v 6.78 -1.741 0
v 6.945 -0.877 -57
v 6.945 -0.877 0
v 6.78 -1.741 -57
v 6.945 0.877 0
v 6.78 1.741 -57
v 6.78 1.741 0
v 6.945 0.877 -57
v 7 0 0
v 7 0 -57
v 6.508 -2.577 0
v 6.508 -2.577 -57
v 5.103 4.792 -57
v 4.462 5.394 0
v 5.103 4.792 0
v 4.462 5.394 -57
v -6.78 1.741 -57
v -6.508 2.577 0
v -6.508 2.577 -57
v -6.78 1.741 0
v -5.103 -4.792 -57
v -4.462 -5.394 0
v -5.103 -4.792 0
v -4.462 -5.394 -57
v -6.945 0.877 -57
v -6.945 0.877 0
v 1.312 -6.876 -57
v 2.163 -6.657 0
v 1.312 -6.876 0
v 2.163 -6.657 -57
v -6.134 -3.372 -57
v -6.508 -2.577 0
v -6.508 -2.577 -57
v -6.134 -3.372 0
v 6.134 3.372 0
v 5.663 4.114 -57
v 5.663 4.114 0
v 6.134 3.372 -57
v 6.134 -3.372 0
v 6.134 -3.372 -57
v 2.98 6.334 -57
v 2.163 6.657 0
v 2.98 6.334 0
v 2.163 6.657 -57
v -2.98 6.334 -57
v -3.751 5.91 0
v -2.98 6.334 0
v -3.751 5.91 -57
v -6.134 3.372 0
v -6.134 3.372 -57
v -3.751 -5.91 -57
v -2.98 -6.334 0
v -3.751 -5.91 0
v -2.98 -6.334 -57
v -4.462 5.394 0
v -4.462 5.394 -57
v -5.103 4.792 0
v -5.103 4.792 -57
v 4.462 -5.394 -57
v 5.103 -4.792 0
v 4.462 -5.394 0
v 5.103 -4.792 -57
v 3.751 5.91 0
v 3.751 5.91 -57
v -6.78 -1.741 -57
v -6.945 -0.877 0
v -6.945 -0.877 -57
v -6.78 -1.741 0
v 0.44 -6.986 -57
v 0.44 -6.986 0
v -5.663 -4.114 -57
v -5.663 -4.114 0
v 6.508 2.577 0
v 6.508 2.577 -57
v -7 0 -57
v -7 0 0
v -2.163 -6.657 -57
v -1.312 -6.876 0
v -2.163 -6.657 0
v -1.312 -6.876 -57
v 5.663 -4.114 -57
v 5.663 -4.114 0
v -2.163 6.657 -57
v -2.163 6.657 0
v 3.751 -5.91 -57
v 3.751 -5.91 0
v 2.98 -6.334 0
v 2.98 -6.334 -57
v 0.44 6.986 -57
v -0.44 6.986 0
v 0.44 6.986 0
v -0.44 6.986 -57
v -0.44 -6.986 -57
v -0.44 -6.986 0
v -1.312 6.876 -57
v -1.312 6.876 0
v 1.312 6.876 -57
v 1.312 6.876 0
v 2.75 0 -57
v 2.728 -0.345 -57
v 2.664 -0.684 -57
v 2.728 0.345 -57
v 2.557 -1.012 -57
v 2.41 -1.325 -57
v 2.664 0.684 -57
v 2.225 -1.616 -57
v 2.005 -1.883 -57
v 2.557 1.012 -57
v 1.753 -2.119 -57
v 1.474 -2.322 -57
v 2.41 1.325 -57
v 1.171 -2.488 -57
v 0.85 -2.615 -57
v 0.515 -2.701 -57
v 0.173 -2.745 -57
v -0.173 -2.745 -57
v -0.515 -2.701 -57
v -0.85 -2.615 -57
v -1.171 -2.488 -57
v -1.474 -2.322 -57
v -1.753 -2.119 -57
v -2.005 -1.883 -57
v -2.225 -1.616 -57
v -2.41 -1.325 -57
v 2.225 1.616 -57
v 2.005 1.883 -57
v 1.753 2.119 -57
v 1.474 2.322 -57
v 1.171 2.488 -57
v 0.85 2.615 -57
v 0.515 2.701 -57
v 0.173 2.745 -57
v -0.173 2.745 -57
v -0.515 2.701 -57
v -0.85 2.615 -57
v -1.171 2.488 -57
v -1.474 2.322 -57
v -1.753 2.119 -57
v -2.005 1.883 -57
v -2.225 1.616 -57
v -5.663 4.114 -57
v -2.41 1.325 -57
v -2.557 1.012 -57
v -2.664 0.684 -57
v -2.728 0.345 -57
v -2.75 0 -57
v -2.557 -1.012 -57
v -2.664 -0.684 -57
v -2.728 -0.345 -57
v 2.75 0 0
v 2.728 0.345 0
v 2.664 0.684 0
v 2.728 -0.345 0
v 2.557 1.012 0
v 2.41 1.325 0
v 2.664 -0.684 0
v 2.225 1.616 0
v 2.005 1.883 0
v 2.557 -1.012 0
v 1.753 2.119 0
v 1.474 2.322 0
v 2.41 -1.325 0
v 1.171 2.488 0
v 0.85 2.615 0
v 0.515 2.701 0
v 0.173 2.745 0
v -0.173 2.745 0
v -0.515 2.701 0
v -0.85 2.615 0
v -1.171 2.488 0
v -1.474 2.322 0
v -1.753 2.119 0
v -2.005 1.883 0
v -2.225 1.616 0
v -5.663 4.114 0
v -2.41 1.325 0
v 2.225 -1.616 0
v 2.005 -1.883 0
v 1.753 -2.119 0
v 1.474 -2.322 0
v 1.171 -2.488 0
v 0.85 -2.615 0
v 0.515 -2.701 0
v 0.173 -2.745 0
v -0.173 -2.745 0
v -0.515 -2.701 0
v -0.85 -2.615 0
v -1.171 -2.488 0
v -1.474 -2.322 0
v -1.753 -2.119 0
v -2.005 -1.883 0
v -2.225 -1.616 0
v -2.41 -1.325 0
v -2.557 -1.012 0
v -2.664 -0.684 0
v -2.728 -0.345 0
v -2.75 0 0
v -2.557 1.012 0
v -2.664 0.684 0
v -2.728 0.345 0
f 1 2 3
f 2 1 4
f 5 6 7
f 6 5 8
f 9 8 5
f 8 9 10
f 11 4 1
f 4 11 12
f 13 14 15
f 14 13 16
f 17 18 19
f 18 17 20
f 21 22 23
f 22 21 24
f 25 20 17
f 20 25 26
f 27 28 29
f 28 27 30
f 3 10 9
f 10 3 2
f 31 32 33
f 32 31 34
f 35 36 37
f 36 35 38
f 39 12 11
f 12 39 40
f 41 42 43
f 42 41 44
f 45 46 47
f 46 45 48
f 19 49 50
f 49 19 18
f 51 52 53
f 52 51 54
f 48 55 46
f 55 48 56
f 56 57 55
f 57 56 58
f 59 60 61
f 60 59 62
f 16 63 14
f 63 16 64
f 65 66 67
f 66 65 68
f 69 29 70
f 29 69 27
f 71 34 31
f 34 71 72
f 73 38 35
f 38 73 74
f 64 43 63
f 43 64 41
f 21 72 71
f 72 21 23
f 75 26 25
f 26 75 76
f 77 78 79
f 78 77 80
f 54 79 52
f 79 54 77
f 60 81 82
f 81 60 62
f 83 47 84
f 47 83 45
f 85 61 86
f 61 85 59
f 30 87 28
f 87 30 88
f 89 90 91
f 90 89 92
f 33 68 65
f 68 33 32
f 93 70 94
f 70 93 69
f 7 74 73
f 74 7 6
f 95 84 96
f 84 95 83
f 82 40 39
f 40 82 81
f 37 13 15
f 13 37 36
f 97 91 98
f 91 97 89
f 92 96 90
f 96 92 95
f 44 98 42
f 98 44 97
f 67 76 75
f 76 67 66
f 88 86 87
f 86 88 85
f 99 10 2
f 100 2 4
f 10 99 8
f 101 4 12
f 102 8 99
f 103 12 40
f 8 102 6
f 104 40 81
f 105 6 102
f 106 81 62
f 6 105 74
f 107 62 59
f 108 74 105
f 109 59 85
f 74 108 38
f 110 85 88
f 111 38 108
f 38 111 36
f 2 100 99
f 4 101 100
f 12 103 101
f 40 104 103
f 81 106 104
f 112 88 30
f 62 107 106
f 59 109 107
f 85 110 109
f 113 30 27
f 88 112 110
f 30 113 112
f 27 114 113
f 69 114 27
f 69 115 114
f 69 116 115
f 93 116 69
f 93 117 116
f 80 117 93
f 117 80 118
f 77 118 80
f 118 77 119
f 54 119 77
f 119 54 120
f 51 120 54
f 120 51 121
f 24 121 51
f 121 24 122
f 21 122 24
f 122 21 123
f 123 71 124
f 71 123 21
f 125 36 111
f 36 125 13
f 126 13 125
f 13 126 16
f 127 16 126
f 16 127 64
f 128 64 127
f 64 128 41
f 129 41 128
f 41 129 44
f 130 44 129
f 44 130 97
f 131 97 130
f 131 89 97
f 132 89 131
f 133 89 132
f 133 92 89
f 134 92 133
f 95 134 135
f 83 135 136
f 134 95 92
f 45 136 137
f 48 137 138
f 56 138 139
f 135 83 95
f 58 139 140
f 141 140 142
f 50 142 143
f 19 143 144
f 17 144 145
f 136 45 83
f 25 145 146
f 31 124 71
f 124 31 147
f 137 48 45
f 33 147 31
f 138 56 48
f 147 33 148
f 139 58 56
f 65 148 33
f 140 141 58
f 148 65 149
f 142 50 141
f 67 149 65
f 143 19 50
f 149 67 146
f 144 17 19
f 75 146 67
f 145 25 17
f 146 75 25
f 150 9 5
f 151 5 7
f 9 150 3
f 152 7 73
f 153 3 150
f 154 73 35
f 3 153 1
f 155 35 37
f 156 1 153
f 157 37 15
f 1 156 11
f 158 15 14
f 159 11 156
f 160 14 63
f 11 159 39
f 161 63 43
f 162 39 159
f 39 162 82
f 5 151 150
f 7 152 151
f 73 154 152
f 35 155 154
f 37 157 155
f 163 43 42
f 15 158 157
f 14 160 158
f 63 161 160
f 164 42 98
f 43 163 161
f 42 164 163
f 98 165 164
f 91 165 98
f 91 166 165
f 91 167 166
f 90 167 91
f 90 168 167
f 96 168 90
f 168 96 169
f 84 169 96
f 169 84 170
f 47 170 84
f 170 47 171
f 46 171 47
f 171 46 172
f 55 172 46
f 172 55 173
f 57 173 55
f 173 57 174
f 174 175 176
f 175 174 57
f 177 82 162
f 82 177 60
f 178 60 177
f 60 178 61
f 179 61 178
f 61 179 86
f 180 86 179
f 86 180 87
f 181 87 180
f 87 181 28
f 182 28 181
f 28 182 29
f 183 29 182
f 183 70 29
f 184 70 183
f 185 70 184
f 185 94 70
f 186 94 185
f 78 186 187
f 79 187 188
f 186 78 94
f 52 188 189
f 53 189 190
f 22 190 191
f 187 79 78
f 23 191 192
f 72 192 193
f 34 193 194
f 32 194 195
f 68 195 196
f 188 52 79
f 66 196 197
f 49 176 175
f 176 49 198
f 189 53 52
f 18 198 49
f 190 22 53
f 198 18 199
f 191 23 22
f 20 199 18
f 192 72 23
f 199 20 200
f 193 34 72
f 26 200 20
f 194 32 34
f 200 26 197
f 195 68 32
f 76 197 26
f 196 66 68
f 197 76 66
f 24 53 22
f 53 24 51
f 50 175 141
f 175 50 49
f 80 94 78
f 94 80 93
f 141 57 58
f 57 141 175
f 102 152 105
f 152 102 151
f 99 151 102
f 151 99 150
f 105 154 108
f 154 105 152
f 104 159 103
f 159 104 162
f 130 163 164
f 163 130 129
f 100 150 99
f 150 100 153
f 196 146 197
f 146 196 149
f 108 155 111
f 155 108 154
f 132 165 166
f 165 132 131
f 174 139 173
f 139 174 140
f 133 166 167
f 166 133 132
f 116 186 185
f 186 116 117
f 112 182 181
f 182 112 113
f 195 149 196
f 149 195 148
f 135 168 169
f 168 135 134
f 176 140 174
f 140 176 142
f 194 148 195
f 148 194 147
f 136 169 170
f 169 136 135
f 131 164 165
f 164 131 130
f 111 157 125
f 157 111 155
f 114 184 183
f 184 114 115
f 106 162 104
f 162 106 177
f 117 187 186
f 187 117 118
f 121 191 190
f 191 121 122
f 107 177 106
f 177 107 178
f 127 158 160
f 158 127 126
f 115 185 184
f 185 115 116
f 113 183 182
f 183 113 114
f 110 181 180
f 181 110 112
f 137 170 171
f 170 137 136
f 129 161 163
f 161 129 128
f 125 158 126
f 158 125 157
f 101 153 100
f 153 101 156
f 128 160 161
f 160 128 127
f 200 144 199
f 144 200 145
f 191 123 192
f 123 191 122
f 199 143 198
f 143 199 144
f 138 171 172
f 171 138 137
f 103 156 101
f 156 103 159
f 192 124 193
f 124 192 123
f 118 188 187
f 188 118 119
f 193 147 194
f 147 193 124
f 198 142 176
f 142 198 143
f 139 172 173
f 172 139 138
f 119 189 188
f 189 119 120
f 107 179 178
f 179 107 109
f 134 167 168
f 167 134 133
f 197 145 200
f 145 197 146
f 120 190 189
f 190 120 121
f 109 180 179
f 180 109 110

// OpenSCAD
$fn = 50;


difference() {
	union() {
		translate(v = [0, 0, -57.0000000000]) {
			cylinder(h = 57, r = 7.0000000000);
		}
		cylinder(h = 0, r = 10.0000000000);
	}
	union() {
		#translate(v = [0, 0, -57]) {
			cylinder(h = 57, r = 2.7500000000);
		}
	}
}
